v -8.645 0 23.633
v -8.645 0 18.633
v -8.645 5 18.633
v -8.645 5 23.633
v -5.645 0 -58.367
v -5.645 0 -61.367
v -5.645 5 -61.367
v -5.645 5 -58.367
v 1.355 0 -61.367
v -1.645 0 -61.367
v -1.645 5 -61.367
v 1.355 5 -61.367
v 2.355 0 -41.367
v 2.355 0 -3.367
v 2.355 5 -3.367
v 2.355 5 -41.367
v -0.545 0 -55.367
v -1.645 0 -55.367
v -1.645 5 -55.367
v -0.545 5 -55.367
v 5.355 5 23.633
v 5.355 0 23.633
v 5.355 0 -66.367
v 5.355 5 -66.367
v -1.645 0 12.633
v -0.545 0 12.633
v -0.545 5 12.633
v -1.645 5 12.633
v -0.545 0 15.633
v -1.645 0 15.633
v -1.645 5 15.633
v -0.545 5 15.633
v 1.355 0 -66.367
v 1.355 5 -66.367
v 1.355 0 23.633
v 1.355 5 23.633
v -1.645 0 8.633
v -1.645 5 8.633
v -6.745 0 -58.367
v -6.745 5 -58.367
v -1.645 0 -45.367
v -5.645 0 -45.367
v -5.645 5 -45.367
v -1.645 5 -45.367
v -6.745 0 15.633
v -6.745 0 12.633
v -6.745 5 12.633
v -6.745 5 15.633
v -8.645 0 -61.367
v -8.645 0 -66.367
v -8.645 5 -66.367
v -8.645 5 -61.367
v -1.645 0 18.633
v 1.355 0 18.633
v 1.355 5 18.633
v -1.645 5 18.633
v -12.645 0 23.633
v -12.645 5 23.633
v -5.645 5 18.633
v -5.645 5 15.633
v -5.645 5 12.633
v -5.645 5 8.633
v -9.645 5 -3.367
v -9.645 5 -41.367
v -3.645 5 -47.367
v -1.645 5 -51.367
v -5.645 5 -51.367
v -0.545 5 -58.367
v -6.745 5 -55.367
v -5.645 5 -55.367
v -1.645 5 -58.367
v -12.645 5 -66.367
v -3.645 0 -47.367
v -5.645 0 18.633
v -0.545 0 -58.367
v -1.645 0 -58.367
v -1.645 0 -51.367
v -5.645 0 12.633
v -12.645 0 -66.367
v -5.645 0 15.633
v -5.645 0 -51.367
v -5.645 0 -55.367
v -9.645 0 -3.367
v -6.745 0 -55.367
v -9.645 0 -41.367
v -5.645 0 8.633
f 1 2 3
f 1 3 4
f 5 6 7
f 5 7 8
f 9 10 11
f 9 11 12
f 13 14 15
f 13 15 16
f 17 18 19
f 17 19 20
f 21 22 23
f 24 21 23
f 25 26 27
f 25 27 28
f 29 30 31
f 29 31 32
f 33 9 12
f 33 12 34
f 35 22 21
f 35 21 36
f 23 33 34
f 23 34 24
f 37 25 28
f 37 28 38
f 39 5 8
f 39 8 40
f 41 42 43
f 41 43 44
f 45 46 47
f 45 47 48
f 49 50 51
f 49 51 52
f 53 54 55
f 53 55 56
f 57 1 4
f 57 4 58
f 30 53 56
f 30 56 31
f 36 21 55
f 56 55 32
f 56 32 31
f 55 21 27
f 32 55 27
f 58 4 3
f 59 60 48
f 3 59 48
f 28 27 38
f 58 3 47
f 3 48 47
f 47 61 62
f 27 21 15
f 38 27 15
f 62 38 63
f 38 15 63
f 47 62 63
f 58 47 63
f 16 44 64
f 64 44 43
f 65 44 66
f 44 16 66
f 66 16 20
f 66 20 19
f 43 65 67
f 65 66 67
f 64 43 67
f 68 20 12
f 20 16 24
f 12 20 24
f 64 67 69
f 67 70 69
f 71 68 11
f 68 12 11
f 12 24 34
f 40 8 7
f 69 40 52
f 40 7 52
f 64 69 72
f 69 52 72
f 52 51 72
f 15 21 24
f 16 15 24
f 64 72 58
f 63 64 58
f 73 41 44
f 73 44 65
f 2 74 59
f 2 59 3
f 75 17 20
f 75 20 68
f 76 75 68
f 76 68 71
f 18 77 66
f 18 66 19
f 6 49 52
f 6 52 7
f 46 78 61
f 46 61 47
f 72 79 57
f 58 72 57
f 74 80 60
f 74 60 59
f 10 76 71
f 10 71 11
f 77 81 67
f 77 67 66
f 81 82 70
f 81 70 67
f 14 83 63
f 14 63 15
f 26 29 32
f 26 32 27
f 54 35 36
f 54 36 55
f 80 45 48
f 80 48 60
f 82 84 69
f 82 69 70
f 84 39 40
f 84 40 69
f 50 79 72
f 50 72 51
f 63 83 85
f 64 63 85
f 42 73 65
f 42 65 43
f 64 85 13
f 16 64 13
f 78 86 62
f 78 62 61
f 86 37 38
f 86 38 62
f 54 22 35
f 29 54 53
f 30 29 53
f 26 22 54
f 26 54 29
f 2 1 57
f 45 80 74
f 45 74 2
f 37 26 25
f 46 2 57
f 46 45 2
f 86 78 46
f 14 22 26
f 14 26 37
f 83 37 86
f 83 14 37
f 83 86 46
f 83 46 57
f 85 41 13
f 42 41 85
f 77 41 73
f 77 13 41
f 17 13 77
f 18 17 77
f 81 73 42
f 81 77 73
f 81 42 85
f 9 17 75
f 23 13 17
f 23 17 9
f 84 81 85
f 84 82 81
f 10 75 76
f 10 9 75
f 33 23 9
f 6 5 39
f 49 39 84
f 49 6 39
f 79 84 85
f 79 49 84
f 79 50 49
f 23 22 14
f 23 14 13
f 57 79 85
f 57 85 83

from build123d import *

# Parameters (mm, degrees)
SKETCH1_W           = 12
SKETCH1_H           = 38
BOSS_EXTRUDE4_DEPTH = 5


with BuildPart() as part:
    # Sketch1 → Boss-Extrude4 (new body)
    with BuildSketch(Plane(origin=(0, 0, 0), x_dir=(1, 0, 0), z_dir=(0, 1, 0))):
        Polygon((-8.645320197, 61.366995074), (-5.645320197, 61.366995074), (-5.645320197, 58.366995074), (-6.745320197, 58.366995074), (-6.745320197, 55.366995074), (-5.645320197, 55.366995074), (-5.645320197, 51.366995074), (-1.645320197, 51.366995074), (-1.645320197, 55.366995074), (-0.545320197, 55.366995074), (-0.545320197, 58.366995074), (-1.645320197, 58.366995074), (-1.645320197, 61.366995074), (1.354679803, 61.366995074), (1.354679803, 66.366995074), (5.354679803, 66.366995074), (5.354679803, 61.366995074), (5.354679803, 16.366995074), (5.354679803, -3.633004926), (5.354679803, -18.633004926), (5.354679803, -23.633004926), (1.354679803, -23.633004926), (1.354679803, -18.633004926), (-1.645320197, -18.633004926), (-1.645320197, -15.633004926), (-0.545320197, -15.633004926), (-0.545320197, -12.633004926), (-1.645320197, -12.633004926), (-1.645320197, -8.633004926), (-5.645320197, -8.633004926), (-5.645320197, -12.633004926), (-6.745320197, -12.633004926), (-6.745320197, -15.633004926), (-5.645320197, -15.633004926), (-5.645320197, -18.633004926), (-8.645320197, -18.633004926), (-8.645320197, -23.633004926), (-12.645320197, -23.633004926), (-12.645320197, -18.633004926), (-12.645320197, -3.633004926), (-12.645320197, 16.366995074), (-12.645320197, 61.366995074), (-12.645320197, 66.366995074), (-8.645320197, 66.366995074), align=None)
        with Locations((-3.645320197, 22.366995074)):
            Rectangle(SKETCH1_W, SKETCH1_H, mode=Mode.SUBTRACT)
        Polygon((-5.645320197, 45.366995074), (-1.645320197, 45.366995074), (-3.645320197, 47.366995074), align=None, mode=Mode.SUBTRACT)
    extrude(amount=BOSS_EXTRUDE4_DEPTH)


solid = part.part
